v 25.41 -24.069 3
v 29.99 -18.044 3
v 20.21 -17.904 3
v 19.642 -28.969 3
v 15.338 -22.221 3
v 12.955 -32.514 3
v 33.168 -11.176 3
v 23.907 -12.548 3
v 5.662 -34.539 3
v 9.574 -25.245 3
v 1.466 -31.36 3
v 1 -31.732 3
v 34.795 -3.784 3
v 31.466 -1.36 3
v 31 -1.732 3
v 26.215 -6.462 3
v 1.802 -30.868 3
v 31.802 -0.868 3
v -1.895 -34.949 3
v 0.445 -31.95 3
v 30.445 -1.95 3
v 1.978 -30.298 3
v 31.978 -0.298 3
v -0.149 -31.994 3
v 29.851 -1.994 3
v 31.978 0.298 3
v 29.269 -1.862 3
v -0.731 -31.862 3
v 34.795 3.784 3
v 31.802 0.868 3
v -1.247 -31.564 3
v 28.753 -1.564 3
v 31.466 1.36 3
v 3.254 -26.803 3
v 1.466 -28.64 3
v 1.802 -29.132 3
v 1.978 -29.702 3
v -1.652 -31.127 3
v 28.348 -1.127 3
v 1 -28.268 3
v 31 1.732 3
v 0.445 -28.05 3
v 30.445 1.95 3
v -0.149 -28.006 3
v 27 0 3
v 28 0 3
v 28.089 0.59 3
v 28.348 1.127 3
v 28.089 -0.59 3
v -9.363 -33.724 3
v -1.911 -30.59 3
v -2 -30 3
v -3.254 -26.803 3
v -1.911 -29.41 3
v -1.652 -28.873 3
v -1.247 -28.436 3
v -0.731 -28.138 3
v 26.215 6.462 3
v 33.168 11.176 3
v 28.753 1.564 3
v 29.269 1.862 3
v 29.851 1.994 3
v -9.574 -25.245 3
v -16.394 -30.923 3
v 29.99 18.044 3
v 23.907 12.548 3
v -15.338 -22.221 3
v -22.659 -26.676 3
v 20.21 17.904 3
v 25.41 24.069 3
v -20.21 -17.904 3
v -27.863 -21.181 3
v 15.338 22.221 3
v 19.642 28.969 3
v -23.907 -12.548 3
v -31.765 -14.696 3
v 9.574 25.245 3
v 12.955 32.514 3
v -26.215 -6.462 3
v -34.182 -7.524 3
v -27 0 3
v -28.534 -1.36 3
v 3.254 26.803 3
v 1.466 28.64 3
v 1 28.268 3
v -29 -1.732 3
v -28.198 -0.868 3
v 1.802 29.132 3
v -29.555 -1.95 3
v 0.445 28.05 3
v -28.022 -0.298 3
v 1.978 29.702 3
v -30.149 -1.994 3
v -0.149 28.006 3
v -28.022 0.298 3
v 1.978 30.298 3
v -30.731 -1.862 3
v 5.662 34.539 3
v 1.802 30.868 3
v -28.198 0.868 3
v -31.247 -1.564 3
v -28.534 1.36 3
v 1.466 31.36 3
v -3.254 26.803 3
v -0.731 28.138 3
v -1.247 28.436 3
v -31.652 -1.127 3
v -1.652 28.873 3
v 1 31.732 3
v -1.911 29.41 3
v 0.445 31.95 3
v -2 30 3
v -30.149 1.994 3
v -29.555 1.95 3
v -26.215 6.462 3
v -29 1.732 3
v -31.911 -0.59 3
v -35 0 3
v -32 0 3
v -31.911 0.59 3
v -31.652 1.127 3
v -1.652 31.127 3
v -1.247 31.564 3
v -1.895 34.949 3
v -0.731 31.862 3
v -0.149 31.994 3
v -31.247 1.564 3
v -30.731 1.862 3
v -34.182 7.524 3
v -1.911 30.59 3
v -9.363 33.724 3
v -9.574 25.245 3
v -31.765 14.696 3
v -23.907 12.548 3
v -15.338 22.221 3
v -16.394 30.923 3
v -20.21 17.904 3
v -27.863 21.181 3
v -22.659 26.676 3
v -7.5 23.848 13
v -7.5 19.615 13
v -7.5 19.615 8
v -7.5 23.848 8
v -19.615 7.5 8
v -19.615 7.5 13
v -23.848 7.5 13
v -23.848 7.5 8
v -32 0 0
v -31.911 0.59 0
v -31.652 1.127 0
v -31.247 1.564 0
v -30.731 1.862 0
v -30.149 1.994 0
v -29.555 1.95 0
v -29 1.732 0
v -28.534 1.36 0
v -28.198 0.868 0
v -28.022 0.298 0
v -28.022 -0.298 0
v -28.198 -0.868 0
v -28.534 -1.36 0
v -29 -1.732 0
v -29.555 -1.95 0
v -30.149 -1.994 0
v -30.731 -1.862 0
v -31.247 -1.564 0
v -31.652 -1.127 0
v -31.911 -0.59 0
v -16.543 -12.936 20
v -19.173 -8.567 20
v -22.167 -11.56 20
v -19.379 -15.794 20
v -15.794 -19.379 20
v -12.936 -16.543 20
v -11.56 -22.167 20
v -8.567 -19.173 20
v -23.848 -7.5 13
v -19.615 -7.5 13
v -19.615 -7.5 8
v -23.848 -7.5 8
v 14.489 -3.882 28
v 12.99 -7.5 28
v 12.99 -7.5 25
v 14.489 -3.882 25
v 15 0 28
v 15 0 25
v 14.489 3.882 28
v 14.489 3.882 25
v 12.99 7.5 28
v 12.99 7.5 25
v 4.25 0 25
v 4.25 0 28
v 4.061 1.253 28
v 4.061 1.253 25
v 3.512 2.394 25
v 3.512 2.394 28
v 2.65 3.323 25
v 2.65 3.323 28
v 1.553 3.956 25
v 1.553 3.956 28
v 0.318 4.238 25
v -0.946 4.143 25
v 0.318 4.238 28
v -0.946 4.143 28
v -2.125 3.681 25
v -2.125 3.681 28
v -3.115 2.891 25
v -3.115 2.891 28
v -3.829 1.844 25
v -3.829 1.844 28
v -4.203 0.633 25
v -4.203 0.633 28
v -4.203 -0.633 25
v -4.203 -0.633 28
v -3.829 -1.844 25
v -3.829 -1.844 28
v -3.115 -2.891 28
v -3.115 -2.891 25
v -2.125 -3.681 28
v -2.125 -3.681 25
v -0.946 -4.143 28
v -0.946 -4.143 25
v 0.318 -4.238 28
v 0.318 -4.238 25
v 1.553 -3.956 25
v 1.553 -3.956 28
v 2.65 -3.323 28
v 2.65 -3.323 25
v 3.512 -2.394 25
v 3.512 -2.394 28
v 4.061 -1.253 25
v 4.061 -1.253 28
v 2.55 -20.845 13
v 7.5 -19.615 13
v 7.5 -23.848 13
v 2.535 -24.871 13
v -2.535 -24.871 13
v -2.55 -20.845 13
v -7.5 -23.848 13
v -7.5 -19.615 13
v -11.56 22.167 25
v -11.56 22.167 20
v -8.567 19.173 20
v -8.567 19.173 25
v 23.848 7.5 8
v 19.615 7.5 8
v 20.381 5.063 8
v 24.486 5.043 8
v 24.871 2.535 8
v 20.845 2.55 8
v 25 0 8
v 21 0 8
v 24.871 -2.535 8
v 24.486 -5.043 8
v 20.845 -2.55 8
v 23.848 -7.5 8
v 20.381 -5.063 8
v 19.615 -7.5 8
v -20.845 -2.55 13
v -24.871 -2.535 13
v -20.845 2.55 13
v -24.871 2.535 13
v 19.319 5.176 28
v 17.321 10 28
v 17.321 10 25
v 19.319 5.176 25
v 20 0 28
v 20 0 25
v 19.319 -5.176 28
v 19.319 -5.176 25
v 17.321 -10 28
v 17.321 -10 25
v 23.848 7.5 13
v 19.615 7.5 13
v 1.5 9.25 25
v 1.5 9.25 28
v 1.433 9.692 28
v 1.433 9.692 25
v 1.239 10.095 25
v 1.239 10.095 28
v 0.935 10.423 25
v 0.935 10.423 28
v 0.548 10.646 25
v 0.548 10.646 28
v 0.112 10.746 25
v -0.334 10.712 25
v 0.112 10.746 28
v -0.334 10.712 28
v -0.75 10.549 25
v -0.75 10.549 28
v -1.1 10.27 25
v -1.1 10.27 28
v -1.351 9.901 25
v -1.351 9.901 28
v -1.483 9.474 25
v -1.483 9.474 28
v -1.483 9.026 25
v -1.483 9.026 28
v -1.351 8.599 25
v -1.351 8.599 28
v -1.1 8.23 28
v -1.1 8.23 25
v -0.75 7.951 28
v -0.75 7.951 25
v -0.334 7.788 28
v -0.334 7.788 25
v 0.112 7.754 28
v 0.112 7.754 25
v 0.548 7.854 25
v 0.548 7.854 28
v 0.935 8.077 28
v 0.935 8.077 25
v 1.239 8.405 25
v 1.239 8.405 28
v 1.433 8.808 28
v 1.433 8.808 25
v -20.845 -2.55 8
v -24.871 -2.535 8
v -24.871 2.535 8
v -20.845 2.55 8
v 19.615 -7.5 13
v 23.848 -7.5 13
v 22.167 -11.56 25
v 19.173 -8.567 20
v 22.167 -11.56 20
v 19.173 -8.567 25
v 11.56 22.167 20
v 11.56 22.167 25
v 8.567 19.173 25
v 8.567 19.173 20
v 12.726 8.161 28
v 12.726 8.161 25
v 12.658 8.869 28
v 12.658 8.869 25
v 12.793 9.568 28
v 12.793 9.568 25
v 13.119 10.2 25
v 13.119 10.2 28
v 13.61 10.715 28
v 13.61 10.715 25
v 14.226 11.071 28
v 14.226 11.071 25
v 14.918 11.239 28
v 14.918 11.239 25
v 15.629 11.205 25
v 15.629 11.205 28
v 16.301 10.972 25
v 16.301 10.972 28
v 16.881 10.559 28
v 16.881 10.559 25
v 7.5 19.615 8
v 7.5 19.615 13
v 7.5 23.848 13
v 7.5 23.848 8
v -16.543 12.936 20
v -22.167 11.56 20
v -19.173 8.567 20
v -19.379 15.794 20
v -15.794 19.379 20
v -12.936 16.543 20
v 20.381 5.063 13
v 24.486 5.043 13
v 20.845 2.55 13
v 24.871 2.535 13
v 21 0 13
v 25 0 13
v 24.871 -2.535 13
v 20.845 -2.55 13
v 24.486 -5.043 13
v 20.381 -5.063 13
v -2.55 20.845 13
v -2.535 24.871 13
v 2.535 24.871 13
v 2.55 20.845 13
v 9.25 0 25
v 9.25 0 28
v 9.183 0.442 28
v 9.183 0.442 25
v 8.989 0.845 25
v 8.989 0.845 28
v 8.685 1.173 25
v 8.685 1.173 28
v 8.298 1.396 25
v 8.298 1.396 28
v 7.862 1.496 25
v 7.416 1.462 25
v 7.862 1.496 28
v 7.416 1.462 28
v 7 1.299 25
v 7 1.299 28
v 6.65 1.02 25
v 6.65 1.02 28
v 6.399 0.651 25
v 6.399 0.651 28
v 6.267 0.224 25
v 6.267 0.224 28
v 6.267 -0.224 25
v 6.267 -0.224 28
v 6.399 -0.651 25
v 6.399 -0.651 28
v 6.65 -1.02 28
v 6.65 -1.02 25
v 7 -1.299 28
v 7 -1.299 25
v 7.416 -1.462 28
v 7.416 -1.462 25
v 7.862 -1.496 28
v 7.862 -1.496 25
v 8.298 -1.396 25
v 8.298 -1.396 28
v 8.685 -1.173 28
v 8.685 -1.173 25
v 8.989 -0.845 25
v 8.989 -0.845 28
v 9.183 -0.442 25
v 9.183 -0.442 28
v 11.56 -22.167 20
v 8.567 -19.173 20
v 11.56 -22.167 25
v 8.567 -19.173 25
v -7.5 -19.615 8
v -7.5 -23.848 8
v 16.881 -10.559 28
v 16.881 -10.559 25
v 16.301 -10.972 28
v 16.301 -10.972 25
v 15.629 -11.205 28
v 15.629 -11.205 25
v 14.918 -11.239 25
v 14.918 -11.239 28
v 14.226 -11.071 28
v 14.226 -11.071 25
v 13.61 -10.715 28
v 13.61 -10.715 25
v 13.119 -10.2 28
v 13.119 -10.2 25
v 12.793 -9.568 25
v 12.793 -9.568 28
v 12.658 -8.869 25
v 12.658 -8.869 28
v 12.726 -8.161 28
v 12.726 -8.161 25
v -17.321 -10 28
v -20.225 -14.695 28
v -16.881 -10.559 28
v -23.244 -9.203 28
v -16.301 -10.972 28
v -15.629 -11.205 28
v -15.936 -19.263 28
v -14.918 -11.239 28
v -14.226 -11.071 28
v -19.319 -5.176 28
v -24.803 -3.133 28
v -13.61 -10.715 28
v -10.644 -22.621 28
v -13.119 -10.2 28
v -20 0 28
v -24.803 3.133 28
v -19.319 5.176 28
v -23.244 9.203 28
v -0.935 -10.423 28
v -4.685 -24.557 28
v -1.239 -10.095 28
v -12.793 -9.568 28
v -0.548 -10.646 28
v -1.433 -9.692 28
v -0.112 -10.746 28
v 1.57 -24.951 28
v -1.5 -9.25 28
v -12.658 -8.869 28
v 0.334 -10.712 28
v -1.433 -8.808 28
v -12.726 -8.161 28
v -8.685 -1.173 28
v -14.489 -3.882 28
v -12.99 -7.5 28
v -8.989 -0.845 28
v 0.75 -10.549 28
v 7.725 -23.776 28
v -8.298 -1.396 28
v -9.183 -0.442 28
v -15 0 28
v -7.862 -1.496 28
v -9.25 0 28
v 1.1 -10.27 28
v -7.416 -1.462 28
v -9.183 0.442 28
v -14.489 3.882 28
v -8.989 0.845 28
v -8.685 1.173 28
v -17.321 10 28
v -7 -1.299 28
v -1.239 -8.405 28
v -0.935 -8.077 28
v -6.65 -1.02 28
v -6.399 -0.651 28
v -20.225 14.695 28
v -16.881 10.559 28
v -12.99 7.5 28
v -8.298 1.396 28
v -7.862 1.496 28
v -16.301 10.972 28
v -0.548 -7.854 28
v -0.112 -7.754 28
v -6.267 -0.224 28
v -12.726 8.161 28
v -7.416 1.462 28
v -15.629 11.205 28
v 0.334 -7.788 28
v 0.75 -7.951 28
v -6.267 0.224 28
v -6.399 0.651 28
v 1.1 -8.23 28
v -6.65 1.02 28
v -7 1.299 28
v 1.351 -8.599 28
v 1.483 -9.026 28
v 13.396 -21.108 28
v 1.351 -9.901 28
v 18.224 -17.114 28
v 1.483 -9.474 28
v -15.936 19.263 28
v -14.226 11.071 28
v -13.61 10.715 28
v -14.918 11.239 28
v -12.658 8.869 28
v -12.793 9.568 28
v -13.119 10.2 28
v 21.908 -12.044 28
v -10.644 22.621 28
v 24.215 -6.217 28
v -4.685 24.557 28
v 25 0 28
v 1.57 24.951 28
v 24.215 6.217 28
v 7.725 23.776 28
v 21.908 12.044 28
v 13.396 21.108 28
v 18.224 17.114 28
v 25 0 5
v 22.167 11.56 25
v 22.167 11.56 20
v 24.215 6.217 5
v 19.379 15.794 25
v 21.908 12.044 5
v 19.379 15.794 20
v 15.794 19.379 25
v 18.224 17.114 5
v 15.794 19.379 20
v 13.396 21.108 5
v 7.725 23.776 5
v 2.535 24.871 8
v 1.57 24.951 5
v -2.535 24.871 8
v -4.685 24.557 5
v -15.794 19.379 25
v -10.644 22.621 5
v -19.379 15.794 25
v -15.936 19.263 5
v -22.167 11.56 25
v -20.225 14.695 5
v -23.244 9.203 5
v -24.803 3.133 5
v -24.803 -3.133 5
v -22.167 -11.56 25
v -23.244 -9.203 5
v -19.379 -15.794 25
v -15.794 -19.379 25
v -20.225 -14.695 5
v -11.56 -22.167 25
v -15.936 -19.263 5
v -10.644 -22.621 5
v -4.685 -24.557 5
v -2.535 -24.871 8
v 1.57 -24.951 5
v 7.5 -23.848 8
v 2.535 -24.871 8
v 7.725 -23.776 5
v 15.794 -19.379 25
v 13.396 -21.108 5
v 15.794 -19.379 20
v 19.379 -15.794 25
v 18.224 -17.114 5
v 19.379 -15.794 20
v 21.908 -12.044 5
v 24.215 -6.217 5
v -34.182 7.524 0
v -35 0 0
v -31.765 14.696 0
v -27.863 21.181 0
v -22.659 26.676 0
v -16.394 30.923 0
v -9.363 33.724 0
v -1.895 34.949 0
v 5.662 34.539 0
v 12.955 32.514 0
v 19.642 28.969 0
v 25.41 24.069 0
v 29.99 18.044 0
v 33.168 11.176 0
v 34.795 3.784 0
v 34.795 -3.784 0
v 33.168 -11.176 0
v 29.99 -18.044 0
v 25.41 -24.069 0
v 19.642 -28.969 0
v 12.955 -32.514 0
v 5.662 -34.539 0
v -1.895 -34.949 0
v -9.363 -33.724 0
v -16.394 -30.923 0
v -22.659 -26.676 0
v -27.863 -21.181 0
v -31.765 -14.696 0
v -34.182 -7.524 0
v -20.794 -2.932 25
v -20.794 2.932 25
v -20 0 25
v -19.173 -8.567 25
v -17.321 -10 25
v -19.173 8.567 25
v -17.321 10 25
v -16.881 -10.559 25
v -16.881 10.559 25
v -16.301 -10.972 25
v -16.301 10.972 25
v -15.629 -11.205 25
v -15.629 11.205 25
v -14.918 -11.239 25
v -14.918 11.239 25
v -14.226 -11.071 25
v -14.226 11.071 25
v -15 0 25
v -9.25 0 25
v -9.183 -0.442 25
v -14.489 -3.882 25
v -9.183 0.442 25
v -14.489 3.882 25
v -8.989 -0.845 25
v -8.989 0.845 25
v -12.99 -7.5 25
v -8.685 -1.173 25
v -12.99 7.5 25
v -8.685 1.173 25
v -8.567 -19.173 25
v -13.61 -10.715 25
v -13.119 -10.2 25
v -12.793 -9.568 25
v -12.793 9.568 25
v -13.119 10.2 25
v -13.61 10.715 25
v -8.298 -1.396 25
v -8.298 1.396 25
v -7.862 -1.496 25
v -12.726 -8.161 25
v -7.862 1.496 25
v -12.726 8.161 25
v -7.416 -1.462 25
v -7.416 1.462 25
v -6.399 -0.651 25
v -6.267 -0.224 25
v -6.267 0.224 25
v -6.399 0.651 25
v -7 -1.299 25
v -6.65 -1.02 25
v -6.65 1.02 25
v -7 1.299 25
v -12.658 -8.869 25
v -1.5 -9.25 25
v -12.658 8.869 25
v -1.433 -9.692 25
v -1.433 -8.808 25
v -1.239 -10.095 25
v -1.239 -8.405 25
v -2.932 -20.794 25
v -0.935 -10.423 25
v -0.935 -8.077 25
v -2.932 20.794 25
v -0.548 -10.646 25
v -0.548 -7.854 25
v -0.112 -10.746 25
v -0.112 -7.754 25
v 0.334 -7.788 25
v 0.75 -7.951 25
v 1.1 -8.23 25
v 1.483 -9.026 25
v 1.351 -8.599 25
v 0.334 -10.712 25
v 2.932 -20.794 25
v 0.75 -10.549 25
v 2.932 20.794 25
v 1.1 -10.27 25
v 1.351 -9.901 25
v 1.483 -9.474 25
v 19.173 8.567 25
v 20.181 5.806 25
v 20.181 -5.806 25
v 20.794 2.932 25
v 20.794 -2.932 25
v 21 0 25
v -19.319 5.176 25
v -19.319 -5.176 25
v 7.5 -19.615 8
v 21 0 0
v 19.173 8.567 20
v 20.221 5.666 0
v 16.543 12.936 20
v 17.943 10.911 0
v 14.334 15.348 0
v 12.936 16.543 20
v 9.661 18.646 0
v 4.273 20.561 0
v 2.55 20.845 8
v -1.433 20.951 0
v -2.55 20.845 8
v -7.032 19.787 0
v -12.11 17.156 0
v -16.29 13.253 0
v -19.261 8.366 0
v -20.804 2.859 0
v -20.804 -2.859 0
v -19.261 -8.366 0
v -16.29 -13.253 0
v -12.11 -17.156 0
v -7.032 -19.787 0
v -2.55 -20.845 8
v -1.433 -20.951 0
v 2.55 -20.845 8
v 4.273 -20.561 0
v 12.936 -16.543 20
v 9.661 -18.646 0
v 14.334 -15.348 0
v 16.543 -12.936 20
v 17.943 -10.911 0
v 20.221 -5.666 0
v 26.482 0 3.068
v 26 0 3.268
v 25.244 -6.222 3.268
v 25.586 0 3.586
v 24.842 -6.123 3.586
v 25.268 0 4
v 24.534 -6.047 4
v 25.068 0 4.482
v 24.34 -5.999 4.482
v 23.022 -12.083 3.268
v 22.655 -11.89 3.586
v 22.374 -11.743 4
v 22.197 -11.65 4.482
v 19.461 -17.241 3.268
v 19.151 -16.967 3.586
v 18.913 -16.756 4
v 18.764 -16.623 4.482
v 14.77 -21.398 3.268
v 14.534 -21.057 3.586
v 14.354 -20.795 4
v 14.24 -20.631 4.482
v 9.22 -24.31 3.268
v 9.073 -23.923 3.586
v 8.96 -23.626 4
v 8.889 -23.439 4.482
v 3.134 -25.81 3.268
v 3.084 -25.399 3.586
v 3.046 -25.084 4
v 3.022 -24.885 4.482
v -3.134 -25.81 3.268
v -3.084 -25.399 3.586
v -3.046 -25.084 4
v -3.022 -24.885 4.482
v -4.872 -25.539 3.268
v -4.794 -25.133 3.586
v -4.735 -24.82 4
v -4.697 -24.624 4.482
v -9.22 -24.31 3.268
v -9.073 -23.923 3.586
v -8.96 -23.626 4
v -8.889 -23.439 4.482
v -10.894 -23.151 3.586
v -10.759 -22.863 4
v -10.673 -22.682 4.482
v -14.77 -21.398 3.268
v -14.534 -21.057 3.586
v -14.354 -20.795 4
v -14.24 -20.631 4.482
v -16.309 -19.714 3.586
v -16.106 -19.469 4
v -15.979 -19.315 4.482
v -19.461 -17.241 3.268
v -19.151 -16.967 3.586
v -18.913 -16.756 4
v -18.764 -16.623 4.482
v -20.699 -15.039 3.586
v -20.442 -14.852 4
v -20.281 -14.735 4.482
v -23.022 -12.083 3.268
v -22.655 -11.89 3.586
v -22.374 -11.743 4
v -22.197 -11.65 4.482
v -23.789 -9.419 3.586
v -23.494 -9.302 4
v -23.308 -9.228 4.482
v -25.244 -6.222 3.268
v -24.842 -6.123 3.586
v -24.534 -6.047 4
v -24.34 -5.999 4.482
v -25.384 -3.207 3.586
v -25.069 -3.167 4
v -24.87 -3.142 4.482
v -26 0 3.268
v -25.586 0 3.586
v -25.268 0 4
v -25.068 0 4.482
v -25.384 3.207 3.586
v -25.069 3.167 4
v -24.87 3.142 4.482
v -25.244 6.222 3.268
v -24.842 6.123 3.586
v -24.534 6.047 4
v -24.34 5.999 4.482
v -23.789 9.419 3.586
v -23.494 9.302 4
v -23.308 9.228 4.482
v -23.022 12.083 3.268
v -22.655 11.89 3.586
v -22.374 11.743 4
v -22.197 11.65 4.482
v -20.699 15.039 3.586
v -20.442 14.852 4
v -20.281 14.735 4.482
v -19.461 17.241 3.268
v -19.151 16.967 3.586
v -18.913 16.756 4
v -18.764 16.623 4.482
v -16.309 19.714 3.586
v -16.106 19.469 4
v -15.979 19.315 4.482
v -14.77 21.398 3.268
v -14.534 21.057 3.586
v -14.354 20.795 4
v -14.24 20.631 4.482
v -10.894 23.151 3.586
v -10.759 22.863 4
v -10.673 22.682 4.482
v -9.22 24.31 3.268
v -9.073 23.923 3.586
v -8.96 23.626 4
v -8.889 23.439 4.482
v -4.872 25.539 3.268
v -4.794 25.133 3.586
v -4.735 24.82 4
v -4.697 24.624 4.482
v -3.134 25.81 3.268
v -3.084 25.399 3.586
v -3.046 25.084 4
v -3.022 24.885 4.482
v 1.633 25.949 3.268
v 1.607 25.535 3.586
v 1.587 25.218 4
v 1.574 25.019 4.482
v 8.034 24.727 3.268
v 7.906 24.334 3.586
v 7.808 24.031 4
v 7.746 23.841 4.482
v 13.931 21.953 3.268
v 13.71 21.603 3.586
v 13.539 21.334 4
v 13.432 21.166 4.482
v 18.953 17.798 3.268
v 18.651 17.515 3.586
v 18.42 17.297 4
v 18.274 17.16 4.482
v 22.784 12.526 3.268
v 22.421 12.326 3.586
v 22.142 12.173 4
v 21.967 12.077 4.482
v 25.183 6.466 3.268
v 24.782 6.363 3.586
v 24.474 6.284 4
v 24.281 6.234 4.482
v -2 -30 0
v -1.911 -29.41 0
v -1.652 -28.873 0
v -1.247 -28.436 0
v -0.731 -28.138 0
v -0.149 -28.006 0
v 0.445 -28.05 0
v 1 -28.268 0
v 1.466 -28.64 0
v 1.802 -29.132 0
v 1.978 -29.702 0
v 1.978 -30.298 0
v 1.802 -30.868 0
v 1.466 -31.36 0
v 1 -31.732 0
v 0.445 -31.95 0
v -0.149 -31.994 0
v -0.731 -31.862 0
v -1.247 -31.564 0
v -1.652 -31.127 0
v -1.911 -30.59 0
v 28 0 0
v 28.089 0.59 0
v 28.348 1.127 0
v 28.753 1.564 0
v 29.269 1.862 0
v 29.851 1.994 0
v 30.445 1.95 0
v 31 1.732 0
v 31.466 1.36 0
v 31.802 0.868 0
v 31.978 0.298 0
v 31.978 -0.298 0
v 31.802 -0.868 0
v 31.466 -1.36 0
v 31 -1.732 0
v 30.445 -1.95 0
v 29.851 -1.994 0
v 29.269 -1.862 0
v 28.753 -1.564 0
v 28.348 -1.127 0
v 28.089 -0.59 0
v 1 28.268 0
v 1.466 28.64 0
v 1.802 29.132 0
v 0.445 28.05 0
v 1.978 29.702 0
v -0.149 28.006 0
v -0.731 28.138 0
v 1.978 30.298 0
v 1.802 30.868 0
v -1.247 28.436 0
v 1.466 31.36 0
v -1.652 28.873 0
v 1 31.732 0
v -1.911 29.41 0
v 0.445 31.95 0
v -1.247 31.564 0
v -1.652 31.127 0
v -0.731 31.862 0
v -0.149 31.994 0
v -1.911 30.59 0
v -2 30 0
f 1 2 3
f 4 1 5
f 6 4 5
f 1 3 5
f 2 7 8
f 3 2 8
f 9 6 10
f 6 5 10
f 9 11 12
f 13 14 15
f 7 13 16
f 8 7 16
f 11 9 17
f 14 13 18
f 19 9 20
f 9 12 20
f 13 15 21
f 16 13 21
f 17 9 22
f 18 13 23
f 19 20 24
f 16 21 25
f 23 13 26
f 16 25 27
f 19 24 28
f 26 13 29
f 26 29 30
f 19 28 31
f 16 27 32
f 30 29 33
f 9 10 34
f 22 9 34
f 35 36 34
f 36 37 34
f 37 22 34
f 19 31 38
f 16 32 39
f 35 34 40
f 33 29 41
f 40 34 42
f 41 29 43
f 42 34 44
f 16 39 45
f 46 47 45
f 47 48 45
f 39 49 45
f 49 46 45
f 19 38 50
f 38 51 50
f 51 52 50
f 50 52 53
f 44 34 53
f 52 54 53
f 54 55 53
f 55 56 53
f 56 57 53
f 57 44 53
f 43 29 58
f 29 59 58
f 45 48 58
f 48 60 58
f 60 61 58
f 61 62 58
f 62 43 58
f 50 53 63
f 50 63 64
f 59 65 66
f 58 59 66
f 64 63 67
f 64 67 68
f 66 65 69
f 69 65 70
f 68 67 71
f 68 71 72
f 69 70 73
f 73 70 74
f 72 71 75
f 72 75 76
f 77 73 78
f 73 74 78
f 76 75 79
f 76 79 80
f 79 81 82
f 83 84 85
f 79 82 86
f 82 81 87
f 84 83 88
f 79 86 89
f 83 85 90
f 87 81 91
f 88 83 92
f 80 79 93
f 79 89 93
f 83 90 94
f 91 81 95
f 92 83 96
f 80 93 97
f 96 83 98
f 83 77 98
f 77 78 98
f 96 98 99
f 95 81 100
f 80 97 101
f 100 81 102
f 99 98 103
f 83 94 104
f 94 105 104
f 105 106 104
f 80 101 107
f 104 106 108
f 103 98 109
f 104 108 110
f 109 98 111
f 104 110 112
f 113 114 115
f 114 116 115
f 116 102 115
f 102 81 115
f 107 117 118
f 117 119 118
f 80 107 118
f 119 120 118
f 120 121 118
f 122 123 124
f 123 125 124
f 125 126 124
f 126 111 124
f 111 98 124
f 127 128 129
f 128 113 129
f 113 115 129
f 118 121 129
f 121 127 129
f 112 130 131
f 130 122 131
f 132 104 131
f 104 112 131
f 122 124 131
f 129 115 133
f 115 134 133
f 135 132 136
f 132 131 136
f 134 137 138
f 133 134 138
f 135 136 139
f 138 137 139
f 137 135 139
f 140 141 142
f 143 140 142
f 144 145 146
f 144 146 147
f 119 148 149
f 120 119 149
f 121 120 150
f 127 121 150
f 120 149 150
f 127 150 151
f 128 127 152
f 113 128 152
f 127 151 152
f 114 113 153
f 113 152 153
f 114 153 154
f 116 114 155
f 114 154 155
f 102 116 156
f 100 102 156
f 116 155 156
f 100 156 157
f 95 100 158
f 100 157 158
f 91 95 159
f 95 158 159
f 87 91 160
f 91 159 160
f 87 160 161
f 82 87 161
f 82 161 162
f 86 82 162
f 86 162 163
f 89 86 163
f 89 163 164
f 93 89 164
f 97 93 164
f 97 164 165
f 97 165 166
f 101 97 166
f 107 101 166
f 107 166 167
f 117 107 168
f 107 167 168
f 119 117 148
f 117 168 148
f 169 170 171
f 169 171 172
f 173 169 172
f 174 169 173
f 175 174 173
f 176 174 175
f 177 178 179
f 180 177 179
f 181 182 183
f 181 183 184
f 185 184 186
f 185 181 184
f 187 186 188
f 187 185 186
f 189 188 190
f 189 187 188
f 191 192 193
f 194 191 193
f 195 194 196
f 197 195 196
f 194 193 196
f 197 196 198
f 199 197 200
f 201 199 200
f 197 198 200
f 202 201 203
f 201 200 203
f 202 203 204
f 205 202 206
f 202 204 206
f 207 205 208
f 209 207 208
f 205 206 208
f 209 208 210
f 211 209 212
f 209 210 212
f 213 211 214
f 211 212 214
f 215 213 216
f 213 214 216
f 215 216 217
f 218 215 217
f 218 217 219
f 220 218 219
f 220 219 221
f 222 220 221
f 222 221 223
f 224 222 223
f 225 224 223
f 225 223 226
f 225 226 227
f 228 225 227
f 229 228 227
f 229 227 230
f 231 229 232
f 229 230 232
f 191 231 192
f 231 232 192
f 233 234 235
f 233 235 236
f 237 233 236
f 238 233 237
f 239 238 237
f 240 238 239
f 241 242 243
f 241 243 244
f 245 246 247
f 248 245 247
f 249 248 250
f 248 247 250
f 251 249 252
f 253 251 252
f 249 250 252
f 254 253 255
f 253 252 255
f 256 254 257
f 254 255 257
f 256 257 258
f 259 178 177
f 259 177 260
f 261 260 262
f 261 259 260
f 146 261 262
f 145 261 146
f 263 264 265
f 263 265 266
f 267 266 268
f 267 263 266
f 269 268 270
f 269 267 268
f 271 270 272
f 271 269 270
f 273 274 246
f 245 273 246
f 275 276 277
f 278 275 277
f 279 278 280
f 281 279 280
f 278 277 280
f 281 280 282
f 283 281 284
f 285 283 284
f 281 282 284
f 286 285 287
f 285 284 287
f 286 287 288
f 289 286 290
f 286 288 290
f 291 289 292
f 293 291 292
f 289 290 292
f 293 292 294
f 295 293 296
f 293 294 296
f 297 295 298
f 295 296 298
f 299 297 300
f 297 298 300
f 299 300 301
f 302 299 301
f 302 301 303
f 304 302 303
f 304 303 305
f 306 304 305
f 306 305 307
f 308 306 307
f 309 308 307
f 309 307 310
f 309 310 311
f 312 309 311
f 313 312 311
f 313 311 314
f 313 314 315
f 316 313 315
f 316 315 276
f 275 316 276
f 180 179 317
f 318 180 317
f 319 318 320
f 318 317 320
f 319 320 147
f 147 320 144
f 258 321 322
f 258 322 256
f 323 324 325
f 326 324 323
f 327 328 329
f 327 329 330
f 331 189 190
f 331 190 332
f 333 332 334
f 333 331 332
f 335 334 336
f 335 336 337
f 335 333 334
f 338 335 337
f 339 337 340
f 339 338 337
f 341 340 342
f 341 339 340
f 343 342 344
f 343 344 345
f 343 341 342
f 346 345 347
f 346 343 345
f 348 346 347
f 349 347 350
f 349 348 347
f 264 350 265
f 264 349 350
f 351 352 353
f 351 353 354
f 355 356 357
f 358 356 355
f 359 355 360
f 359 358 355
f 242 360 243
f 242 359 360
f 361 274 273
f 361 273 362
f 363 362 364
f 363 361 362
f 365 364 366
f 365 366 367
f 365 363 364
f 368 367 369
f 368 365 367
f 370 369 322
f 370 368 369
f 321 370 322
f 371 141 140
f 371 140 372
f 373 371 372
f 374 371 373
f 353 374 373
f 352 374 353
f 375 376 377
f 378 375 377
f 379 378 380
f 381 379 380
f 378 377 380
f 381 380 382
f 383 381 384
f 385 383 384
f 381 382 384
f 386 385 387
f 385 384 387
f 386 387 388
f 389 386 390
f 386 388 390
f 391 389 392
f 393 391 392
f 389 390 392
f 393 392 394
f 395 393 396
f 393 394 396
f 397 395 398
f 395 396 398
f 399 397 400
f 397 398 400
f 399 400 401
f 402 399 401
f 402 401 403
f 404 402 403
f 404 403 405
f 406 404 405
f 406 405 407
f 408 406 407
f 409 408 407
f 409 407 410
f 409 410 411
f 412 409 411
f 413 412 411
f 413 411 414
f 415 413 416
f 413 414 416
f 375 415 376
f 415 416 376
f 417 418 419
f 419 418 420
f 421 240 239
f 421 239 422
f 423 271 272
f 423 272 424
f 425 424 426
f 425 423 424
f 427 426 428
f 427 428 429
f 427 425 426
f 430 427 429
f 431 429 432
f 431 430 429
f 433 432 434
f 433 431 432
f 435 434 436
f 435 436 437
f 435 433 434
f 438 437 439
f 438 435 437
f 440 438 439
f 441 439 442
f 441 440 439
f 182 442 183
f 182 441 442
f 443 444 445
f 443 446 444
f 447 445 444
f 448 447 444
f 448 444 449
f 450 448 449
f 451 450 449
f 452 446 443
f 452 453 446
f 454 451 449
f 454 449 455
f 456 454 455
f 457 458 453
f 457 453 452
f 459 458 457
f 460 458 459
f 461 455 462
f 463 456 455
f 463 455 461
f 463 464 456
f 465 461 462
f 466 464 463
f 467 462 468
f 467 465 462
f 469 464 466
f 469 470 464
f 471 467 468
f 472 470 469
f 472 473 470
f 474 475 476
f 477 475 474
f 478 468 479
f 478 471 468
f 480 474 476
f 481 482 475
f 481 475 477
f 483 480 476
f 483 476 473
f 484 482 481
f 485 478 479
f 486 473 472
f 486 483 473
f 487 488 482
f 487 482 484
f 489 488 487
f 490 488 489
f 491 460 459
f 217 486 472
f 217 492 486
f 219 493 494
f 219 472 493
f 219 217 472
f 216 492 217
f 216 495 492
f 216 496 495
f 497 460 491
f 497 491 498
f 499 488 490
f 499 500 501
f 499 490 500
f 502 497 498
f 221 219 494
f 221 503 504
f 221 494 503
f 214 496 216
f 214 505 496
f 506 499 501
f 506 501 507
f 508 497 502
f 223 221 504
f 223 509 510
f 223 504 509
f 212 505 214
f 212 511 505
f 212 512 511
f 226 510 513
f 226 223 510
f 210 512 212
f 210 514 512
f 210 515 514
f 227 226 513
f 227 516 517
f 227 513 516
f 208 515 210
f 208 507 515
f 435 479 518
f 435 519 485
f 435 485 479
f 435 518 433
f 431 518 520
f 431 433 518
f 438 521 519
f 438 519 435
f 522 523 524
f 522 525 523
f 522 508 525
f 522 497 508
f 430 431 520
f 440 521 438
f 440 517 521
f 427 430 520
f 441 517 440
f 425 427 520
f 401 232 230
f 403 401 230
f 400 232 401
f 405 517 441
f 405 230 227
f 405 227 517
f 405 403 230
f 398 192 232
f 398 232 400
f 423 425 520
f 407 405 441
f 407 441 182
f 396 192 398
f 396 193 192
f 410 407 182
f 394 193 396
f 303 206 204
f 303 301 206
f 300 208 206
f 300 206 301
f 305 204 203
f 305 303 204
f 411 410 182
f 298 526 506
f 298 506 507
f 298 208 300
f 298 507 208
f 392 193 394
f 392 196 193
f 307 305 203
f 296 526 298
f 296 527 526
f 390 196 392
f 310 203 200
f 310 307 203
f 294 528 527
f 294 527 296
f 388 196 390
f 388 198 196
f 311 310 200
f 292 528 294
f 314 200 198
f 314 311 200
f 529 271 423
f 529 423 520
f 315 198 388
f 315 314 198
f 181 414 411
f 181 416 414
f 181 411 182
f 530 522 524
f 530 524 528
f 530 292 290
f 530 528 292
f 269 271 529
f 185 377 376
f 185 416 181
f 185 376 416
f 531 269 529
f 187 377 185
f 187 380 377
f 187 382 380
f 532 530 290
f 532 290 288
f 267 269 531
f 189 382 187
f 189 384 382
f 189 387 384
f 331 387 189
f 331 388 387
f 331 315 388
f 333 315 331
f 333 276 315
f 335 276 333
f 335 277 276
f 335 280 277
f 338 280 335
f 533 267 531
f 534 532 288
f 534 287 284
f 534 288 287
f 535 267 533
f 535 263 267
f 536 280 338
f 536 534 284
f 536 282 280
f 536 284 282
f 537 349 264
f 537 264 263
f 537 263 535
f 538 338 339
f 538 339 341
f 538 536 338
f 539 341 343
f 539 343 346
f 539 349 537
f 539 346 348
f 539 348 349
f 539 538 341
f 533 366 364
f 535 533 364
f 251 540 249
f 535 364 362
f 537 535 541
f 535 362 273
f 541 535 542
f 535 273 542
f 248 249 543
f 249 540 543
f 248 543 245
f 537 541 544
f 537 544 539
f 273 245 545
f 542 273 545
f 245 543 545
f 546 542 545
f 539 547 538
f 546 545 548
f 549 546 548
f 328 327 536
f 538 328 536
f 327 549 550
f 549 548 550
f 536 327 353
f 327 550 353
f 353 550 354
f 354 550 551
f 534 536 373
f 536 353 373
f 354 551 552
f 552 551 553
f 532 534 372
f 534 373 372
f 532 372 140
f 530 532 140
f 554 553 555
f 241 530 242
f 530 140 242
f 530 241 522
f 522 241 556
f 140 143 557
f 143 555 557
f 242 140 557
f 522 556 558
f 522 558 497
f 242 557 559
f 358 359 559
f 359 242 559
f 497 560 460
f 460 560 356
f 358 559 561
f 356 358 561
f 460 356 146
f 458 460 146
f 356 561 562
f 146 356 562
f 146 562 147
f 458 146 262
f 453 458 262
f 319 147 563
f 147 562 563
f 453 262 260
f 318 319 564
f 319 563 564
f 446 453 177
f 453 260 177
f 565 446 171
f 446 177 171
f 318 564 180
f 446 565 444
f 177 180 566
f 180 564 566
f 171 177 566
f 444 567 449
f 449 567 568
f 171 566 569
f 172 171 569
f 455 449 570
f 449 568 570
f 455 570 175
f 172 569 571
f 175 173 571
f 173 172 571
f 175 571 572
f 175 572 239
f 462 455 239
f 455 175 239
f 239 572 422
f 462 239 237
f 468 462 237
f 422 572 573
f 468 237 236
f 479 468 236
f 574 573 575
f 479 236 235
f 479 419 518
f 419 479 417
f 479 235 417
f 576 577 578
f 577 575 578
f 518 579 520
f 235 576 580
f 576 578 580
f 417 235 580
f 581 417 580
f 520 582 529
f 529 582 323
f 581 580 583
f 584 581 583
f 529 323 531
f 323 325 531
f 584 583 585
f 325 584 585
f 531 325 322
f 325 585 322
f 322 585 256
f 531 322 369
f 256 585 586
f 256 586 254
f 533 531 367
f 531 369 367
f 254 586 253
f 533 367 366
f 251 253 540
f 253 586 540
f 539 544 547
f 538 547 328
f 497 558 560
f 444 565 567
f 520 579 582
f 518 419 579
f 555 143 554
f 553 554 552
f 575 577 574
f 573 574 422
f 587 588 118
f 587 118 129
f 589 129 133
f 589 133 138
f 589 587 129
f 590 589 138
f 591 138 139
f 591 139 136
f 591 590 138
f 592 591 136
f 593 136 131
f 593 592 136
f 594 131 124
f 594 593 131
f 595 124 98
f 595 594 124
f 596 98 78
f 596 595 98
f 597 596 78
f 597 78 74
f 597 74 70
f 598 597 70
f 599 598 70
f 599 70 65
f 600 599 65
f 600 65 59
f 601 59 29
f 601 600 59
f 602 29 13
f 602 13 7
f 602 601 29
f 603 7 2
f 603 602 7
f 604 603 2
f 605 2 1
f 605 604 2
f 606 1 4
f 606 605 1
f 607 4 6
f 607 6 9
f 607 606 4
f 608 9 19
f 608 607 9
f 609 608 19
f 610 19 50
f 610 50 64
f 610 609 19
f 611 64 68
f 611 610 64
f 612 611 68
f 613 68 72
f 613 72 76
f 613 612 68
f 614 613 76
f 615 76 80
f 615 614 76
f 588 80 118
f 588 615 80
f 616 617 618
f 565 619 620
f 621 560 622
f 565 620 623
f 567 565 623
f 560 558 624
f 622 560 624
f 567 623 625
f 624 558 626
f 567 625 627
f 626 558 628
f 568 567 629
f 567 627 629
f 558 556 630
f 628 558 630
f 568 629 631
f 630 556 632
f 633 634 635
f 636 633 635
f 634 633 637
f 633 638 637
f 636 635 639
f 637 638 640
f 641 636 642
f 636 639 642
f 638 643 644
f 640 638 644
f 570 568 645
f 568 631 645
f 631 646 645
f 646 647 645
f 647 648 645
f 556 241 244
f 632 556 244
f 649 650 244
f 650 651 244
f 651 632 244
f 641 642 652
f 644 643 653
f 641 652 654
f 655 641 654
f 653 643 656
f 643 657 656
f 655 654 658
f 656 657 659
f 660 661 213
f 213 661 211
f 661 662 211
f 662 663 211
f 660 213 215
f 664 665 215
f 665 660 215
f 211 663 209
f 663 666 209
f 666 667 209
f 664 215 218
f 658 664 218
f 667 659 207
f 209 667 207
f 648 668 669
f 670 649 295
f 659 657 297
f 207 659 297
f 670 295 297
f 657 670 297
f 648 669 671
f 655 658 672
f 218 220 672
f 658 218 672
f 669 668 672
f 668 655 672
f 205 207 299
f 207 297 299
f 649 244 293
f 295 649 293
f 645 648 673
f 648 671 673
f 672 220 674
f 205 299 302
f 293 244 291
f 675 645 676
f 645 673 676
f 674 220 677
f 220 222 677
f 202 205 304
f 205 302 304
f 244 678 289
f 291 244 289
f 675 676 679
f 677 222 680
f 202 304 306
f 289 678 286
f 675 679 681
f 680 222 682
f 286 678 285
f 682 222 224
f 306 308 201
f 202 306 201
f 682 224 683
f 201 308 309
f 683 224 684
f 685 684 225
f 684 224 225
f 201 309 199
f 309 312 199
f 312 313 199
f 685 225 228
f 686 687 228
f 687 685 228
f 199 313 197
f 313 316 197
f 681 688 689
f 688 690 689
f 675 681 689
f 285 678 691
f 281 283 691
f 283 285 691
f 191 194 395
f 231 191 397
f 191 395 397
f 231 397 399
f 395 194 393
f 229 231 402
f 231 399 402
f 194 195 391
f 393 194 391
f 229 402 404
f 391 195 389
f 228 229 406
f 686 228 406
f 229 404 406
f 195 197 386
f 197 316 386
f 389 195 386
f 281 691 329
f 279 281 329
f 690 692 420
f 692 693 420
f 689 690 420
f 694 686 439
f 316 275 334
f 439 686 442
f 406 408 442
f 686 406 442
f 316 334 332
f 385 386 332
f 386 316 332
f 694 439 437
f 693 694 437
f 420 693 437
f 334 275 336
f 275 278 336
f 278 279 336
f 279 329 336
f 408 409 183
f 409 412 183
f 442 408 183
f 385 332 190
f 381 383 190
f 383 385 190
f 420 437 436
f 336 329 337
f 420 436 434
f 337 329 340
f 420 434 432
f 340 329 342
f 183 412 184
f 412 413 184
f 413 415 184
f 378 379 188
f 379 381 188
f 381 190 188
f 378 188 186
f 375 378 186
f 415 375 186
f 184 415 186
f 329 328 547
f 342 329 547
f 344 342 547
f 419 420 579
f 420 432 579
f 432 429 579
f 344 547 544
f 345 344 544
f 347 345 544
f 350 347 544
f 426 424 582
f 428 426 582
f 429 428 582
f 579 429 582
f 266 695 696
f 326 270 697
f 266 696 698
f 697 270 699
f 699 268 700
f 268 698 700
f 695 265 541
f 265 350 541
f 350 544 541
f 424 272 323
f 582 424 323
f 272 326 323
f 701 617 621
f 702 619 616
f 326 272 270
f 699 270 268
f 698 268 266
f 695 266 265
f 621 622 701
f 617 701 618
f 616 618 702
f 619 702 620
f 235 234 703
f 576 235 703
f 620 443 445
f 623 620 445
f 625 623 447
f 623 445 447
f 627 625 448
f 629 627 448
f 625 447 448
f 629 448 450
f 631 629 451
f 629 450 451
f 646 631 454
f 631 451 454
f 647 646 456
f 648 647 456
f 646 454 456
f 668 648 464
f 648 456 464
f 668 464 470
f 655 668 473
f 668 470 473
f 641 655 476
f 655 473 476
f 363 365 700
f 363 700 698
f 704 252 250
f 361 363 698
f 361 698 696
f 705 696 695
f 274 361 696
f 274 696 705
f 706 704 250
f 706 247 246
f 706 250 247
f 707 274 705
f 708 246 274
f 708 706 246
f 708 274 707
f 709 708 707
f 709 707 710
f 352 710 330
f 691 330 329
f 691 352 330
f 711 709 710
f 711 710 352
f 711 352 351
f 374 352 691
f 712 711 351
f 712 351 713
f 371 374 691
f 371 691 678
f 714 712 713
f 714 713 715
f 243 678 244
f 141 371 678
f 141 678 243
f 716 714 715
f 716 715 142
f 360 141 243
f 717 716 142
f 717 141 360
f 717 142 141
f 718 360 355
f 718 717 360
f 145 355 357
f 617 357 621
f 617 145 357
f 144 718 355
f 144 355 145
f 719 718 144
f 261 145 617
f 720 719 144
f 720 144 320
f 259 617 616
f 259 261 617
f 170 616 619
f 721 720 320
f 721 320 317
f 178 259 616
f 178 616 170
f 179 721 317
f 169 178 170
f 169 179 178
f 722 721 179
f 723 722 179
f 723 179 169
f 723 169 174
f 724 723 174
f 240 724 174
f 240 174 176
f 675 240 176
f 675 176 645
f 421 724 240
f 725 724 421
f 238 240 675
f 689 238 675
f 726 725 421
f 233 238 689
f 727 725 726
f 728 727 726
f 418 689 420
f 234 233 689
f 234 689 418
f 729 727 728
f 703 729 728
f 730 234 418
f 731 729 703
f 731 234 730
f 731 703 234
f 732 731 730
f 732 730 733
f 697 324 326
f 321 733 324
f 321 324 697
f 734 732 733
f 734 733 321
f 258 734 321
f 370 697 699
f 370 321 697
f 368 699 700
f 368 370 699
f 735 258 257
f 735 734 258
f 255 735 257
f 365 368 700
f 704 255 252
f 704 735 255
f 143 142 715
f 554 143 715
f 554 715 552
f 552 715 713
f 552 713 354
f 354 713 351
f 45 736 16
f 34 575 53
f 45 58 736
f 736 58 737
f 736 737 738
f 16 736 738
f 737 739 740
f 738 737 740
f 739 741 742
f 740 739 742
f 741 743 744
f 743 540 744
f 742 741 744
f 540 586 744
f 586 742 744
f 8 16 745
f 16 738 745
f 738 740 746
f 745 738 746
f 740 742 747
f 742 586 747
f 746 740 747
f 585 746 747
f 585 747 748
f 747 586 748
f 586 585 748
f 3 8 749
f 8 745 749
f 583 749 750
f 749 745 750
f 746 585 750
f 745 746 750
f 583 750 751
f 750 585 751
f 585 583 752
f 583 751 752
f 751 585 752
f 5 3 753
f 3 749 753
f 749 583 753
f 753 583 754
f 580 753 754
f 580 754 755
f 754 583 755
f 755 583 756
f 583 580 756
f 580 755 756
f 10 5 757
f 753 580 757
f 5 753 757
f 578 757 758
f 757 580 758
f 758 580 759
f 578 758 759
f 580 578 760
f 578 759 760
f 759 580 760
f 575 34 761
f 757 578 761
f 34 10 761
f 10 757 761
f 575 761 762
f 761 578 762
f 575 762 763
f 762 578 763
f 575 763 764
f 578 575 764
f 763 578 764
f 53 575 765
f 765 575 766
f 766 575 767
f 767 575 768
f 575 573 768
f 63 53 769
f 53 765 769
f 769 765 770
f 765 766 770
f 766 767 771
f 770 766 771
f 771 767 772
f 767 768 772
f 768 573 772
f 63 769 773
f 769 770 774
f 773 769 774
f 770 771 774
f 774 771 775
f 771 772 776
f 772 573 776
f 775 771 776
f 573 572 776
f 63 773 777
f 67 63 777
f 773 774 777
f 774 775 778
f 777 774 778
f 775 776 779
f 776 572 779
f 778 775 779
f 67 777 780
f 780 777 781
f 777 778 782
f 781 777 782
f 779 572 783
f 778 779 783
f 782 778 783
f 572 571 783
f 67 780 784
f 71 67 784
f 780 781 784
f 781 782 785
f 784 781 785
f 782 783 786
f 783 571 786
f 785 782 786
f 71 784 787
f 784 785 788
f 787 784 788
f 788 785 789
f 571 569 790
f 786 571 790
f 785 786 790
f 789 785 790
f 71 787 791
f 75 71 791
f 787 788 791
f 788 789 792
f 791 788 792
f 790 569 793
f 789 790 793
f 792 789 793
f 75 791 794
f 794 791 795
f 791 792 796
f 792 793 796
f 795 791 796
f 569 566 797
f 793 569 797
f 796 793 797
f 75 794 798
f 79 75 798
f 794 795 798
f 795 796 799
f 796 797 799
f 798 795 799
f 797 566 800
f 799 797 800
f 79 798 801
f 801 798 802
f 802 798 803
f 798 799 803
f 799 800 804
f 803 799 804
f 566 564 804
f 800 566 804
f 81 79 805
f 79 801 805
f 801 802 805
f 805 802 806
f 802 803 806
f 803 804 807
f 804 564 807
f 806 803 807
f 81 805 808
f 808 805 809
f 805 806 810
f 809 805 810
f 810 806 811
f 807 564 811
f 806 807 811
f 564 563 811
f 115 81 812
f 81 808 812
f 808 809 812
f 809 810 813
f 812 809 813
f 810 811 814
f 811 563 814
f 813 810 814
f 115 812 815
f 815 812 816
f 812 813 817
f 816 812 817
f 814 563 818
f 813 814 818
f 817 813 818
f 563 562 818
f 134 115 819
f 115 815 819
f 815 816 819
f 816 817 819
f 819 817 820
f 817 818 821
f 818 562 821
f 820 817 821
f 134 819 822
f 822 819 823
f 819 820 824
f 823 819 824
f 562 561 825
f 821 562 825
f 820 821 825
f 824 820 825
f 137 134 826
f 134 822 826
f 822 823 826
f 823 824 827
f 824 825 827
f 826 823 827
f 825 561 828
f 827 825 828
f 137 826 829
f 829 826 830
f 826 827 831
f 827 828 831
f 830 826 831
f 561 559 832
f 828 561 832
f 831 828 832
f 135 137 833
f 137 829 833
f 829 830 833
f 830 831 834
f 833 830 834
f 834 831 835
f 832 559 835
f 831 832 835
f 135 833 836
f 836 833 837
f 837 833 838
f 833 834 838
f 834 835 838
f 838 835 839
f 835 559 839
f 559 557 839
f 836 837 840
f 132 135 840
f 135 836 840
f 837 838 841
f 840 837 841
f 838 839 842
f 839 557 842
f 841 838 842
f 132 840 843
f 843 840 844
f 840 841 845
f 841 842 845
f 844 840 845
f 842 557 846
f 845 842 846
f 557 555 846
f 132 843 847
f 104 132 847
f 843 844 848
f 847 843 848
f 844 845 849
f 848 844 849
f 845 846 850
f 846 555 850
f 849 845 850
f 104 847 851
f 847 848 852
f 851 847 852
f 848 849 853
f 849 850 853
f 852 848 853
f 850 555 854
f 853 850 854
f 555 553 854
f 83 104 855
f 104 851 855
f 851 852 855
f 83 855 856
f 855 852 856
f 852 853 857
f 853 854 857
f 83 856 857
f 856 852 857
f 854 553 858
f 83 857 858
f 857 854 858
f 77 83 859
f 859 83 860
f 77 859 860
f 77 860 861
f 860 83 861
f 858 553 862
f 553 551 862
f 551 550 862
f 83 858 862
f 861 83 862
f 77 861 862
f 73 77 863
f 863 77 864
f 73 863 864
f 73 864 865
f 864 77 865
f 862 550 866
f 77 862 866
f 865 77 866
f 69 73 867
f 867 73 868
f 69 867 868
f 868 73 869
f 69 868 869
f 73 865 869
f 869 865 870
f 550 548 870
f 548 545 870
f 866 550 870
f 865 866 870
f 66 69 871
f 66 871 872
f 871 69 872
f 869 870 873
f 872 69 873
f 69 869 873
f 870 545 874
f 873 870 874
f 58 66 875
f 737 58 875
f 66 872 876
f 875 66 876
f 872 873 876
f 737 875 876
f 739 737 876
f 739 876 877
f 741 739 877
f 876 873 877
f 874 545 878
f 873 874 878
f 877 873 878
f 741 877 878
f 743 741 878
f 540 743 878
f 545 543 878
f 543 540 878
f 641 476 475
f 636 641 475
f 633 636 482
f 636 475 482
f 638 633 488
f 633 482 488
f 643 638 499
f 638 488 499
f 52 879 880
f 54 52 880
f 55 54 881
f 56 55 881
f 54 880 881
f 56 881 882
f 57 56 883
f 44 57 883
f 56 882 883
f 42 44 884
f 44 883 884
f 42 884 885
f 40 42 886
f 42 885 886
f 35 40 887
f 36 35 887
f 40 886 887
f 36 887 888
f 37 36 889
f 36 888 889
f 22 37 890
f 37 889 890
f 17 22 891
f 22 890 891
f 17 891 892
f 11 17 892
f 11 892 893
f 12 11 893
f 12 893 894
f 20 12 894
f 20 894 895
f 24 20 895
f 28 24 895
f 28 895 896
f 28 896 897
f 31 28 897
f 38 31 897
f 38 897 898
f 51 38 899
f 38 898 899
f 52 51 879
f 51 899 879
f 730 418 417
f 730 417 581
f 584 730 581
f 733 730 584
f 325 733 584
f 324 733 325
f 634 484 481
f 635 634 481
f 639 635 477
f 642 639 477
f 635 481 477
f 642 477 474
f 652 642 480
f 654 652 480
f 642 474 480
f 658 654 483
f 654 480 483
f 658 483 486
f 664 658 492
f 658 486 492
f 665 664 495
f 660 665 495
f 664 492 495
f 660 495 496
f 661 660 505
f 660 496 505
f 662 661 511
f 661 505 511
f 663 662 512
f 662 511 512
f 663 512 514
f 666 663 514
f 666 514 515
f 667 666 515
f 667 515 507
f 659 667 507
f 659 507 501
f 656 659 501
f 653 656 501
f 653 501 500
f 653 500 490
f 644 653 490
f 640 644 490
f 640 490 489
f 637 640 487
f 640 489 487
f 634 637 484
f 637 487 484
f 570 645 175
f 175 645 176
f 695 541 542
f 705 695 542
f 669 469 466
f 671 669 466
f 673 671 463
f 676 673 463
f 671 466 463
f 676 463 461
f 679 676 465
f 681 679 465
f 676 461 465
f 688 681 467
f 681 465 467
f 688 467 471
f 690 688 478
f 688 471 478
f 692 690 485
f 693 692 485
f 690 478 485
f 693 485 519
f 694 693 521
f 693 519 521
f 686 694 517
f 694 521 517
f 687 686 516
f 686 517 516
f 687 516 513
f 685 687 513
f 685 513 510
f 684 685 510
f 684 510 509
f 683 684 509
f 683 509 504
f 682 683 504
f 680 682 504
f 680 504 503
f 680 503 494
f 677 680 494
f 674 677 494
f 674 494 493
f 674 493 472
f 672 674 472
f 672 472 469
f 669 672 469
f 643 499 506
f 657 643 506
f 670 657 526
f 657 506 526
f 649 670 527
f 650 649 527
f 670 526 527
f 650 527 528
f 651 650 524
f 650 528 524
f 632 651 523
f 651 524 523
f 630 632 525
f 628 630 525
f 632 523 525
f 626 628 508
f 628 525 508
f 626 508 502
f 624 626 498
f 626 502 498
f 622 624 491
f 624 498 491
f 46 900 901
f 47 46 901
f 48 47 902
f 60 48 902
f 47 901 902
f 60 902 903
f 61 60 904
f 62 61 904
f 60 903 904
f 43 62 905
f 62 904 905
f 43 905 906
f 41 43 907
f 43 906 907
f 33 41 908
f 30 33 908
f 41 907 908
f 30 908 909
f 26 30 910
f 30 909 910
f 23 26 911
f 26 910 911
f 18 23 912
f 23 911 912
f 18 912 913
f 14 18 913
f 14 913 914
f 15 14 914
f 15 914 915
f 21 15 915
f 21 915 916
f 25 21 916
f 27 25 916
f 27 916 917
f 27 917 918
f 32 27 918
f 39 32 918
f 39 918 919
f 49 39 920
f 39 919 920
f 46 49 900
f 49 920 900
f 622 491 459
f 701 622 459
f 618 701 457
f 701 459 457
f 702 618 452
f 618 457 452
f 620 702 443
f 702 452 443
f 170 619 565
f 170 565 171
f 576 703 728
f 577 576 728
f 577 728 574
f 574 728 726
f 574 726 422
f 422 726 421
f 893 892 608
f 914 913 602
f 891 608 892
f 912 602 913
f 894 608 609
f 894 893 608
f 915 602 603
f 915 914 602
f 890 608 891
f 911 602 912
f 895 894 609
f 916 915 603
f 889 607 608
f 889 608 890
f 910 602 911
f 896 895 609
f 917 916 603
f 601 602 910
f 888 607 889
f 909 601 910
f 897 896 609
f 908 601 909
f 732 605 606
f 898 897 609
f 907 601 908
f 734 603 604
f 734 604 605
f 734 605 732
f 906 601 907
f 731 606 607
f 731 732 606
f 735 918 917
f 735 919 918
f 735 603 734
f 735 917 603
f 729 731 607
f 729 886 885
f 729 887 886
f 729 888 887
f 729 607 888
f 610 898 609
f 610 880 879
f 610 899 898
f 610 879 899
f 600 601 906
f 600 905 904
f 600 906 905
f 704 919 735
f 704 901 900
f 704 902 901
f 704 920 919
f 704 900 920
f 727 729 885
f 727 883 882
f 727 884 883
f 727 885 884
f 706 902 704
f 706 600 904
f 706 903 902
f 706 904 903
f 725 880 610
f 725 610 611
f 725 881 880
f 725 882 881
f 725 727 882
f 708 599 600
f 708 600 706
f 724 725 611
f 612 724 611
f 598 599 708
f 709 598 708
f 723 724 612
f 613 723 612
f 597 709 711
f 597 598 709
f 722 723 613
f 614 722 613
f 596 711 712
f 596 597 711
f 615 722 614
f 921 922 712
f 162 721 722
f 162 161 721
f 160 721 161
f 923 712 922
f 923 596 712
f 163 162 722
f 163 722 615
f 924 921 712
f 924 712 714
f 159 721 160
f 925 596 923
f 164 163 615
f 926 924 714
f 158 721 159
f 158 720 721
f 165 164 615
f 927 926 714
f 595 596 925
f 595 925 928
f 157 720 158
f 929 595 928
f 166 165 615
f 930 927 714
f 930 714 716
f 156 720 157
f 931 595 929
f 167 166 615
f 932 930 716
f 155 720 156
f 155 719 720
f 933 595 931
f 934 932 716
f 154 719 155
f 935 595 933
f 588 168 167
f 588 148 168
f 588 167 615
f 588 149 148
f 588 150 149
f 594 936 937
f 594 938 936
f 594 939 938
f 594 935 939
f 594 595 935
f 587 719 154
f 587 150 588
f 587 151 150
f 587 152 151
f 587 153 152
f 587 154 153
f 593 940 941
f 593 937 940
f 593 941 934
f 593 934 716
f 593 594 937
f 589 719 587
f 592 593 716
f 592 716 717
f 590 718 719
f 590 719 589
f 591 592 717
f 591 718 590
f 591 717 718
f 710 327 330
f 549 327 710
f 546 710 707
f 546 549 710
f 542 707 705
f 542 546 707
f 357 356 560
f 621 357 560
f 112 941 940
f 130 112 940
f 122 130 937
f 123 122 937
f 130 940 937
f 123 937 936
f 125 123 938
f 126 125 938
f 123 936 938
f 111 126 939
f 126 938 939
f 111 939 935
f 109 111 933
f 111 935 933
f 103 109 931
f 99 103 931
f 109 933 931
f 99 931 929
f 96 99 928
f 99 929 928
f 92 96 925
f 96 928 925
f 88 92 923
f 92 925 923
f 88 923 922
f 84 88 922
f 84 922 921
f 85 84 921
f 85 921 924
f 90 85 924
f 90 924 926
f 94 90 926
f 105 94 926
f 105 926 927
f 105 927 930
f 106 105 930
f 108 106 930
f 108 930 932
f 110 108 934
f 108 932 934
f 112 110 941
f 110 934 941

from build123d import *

# Parameters (mm, degrees)
SKETCH_1_R               = 25
SKETCH_1_R_2             = 21
EXTRUDE_1_DEPTH          = 25
SKETCH_2_R               = 25
EXTRUDE_2_DEPTH          = 3
SKETCH_3_R               = 4.25
SKETCH_3_R_2             = 1.5
CUT_EXTRUDE_1_DEPTH      = 3
CUT_EXTRUDE_2_DEPTH      = 3
SKETCH_6_W               = 15
SKETCH_6_H               = 5
CUT_EXTRUDE_3_DEPTH      = 63
SKETCH_8_W               = 5
SKETCH_8_H               = 15
CUT_EXTRUDE_4_DEPTH      = 63
SKETCH_9_W               = 5
SKETCH_9_H               = 15
CUT_EXTRUDE_5_DEPTH      = 63
PATTERN_CIRCULAR_2_COUNT = 4
SKETCH_10_R              = 35
SKETCH_10_R_2            = 21
EXTRUDE_3_DEPTH          = 3
SKETCH_11_R              = 2
CUT_EXTRUDE_6_DEPTH      = 3
FILLET_1_R               = 2


with BuildPart() as part:
    # 草图1 → 凸台-拉伸1 (new body)
    with BuildSketch(Plane.XY):
        Circle(SKETCH_1_R)
        Circle(SKETCH_1_R_2, mode=Mode.SUBTRACT)
    extrude(amount=EXTRUDE_1_DEPTH)

    # 草图2 → 凸台-拉伸2 (add)
    with BuildSketch(Plane.XY.offset(25)):
        Circle(SKETCH_2_R)
    extrude(amount=EXTRUDE_2_DEPTH)

    # 草图3 → 切除-拉伸1 (cut)
    with BuildSketch(Plane.XY.offset(28)):
        Circle(SKETCH_3_R)
        with Locations((0, 9.25)):
            Circle(SKETCH_3_R_2)
        with Locations((7.75, 0)):
            Circle(SKETCH_3_R_2)
        with Locations(Location((0, -9.25, 0), (0, 0, 180))):
            Circle(SKETCH_3_R_2)
        with Locations(Location((-7.75, 0, 0), (0, 0, 180))):
            Circle(SKETCH_3_R_2)
    extrude(amount=-CUT_EXTRUDE_1_DEPTH, mode=Mode.SUBTRACT)

    # 草图4 → 切除-拉伸2 (cut)
    with BuildSketch(Plane.XY.offset(28)):
        with BuildLine():
            ThreePointArc((-17.320508076, 10), (-20, 0), (-17.320508076, -10))
            ThreePointArc((-17.320508076, -10), (-13.905444566, -10.915063509), (-12.990381057, -7.5))
            ThreePointArc((-12.990381057, -7.5), (-15, 0), (-12.990381057, 7.5))
            ThreePointArc((-12.990381057, 7.5), (-13.905444566, 10.915063509), (-17.320508076, 10))
        make_face()
        with BuildLine():
            ThreePointArc((17.320508076, 10), (20, 0), (17.320508076, -10))
            ThreePointArc((17.320508076, -10), (13.905444566, -10.915063509), (12.990381057, -7.5))
            ThreePointArc((12.990381057, -7.5), (15, 0), (12.990381057, 7.5))
            ThreePointArc((12.990381057, 7.5), (13.905444566, 10.915063509), (17.320508076, 10))
        make_face()
    extrude(amount=-CUT_EXTRUDE_2_DEPTH, mode=Mode.SUBTRACT)

    # 草图6 → 切除-拉伸3 (cut)
    with BuildSketch(Plane(origin=(17.67766953, 17.67766953, 28), x_dir=(0.7071067811865488, -0.7071067811865464, 0), z_dir=(0.7071067811865464, 0.7071067811865488, 0))):
        with Locations((0, 5.5)):
            Rectangle(SKETCH_6_W, SKETCH_6_H)
    extrude(amount=-CUT_EXTRUDE_3_DEPTH, mode=Mode.SUBTRACT)

    # 草图8 → 切除-拉伸4 (cut)
    with BuildSketch(Plane(origin=(-17.67766953, 17.67766953, 28), x_dir=(0, 0, 1), z_dir=(-0.7071067811865517, 0.7071067811865435, 0))):
        with Locations((-5.5, 0)):
            Rectangle(SKETCH_8_W, SKETCH_8_H)
    extrude(amount=-CUT_EXTRUDE_4_DEPTH, mode=Mode.SUBTRACT)

    # 草图9 → 切除-拉伸5 (cut)
    with BuildSketch(Plane(origin=(0, 0, 0), x_dir=(0, 0, -1), z_dir=(1, 0, 0))):
        with Locations((-10.5, 0)):
            Rectangle(SKETCH_9_W, SKETCH_9_H)
    cut_extrude_5 = extrude(amount=-CUT_EXTRUDE_5_DEPTH, mode=Mode.SUBTRACT)

    # 阵列(圆周)2: 切除-拉伸5 ×4 about axis
    pattern_circular_2_axis = Axis((0, 0, 0), (0, 0, 1))
    for i in range(1, PATTERN_CIRCULAR_2_COUNT):
        add(cut_extrude_5.rotate(pattern_circular_2_axis, i * 360 / PATTERN_CIRCULAR_2_COUNT), mode=Mode.SUBTRACT)

    # 草图10 → 凸台-拉伸3 (add)
    with BuildSketch(Plane(origin=(0, 0, 0), x_dir=(-1, 0, 0), z_dir=(0, 0, -1))):
        Circle(SKETCH_10_R)
        with Locations(Location((0, 0, 0), (0, 0, 24.075167572))):
            Circle(SKETCH_10_R_2, mode=Mode.SUBTRACT)
    extrude(amount=-EXTRUDE_3_DEPTH)

    # 草图11 → 切除-拉伸6 (cut)
    with BuildSketch(Plane(origin=(0, 0, 0), x_dir=(-1, 0, 0), z_dir=(0, 0, -1))):
        with Locations((0, 30)):
            Circle(SKETCH_11_R)
        with Locations((30, 0)):
            Circle(SKETCH_11_R)
        with Locations((0, -30)):
            Circle(SKETCH_11_R)
        with Locations((-30, 0)):
            Circle(SKETCH_11_R)
    extrude(amount=-CUT_EXTRUDE_6_DEPTH, mode=Mode.SUBTRACT)

    # 圆角1
    fillet_1_edges = [part.edges().sort_by_distance(p)[0] for p in [
        (-25, 0, 3),
    ]]
    fillet(fillet_1_edges, radius=FILLET_1_R)


solid = part.part
